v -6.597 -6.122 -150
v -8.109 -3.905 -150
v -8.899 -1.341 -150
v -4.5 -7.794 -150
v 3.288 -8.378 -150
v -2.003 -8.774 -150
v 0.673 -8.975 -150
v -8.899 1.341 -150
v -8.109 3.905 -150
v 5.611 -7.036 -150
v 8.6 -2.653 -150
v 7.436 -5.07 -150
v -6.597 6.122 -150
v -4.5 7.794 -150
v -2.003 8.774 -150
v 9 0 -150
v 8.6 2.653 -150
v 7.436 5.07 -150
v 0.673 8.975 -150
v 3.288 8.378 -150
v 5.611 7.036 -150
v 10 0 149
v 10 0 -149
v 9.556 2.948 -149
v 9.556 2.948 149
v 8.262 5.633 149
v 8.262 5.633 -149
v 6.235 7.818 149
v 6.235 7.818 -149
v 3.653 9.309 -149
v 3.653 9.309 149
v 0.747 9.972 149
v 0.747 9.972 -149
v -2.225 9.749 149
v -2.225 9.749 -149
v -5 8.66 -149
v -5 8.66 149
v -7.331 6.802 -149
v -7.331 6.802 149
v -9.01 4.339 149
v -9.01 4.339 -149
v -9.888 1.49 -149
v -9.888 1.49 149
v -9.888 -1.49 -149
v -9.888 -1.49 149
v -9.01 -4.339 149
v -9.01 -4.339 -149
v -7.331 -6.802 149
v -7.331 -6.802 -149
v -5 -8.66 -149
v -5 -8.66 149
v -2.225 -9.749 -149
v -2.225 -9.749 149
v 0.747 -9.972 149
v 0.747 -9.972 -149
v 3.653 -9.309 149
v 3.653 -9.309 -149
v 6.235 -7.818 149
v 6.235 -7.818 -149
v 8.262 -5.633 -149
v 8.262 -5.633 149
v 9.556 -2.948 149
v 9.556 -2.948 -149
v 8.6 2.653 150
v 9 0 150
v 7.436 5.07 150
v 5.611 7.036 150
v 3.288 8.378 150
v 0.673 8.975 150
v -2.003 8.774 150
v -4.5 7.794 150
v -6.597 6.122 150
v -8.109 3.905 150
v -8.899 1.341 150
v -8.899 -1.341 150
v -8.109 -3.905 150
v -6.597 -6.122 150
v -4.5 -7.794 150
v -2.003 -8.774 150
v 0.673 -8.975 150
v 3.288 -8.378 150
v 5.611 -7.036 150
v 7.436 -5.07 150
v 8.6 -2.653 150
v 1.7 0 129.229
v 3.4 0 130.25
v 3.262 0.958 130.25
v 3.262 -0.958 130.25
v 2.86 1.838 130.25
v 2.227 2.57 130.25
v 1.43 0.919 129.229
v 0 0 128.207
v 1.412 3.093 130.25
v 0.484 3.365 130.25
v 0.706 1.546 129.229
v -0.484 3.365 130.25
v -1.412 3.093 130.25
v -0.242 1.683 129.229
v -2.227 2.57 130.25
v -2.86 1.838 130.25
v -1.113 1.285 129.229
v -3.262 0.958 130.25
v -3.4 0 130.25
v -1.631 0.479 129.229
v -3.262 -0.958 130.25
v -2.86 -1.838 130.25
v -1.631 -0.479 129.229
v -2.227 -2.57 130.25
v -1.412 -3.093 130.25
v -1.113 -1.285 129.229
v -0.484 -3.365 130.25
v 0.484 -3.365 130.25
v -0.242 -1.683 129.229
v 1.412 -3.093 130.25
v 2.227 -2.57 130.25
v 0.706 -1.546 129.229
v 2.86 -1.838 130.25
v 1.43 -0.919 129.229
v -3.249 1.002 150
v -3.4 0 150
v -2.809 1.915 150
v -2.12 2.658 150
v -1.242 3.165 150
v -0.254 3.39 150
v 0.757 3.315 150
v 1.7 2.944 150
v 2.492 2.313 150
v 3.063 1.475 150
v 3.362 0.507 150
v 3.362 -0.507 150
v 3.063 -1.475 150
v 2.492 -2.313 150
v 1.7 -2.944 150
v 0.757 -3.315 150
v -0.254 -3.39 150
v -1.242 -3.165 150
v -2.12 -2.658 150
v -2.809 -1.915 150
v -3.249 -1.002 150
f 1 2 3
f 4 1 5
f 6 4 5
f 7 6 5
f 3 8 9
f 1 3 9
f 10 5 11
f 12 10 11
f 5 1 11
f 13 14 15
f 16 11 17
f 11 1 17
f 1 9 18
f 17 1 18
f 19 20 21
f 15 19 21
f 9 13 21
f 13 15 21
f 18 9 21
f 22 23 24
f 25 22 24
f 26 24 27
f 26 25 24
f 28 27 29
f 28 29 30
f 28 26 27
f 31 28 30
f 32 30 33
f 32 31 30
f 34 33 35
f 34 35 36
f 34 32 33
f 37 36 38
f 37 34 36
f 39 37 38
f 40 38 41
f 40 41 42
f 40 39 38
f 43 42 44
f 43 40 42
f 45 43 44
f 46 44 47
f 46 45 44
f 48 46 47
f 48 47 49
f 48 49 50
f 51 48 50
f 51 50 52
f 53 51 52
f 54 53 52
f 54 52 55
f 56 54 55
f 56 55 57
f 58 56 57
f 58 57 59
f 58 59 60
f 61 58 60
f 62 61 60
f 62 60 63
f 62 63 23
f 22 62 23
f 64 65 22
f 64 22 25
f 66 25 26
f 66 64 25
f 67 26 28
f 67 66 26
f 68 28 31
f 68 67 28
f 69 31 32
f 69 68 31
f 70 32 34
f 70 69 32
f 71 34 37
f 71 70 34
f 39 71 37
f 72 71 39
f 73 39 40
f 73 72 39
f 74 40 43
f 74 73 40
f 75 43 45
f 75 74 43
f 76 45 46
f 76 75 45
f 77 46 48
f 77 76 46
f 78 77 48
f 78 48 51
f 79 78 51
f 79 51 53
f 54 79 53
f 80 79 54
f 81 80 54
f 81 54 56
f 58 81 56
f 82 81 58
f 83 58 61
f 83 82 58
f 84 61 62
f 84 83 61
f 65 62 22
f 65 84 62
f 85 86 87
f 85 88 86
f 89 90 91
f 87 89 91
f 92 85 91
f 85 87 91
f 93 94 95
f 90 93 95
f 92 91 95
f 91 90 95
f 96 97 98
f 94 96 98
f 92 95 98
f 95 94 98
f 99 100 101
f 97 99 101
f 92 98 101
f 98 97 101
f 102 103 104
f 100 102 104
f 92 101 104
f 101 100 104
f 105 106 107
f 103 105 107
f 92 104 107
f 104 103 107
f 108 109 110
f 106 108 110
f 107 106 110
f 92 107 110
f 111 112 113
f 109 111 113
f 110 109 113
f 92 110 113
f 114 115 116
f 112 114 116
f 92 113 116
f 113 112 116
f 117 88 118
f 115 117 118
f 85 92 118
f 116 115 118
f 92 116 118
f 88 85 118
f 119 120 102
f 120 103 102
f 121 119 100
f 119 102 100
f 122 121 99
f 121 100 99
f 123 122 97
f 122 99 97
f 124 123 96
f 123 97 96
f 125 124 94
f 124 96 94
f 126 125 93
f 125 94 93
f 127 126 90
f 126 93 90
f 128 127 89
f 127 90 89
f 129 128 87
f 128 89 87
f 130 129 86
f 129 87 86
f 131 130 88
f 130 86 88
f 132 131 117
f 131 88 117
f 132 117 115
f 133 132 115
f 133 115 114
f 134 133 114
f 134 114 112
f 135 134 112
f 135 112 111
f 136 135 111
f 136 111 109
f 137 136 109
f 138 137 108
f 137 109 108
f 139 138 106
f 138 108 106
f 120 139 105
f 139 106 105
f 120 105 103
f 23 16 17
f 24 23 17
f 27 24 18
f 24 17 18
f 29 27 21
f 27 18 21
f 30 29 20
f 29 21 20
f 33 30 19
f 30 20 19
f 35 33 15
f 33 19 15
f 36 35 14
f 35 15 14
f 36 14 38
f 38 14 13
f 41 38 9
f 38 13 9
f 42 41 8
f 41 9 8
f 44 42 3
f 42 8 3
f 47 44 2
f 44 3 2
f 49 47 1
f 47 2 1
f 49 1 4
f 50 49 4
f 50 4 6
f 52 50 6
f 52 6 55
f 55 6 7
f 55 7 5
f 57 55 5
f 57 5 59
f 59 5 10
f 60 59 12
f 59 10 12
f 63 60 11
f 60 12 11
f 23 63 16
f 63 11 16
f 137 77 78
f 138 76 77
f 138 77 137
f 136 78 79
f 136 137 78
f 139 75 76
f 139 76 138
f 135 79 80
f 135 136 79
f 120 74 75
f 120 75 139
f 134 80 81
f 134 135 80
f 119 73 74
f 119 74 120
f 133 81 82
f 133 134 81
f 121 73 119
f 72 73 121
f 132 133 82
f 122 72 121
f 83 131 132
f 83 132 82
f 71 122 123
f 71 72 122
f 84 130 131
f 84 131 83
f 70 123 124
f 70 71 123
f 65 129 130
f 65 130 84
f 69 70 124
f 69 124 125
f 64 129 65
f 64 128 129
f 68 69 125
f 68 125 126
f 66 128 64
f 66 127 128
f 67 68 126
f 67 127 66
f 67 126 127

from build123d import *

# Parameters (mm, degrees)
SKETCH1_R             = 10
BOSS_EXTRUDE1_DEPTH   = 150
M8_TAPPED_HOLE1_D     = 6.8
M8_TAPPED_HOLE1_DEPTH = 19.75
M8_TAPPED_HOLE1_TIP   = 2.042926105
CHAMFER1_SIZE         = 1


with BuildPart() as part:
    # Sketch1 → Boss-Extrude1 (new body, symmetric)
    with BuildSketch(Plane.XY):
        Circle(SKETCH1_R)
    extrude(amount=BOSS_EXTRUDE1_DEPTH, both=True)

    # M8 Tapped Hole1
    with Locations(Plane.XY.offset(150)):
        with Locations((0, 0)):
            Hole(M8_TAPPED_HOLE1_D / 2, depth=M8_TAPPED_HOLE1_DEPTH)
            with Locations((0, 0, -(M8_TAPPED_HOLE1_DEPTH + M8_TAPPED_HOLE1_TIP / 2))):  # 118° drill point
                Cone(0, M8_TAPPED_HOLE1_D / 2, M8_TAPPED_HOLE1_TIP, mode=Mode.SUBTRACT)

    # Chamfer1
    chamfer1_edges = [part.edges().sort_by_distance(p)[0] for p in [
        (-10, 0, -150),
        (-10, 0, 150),
    ]]
    chamfer(chamfer1_edges, length=CHAMFER1_SIZE)


solid = part.part
